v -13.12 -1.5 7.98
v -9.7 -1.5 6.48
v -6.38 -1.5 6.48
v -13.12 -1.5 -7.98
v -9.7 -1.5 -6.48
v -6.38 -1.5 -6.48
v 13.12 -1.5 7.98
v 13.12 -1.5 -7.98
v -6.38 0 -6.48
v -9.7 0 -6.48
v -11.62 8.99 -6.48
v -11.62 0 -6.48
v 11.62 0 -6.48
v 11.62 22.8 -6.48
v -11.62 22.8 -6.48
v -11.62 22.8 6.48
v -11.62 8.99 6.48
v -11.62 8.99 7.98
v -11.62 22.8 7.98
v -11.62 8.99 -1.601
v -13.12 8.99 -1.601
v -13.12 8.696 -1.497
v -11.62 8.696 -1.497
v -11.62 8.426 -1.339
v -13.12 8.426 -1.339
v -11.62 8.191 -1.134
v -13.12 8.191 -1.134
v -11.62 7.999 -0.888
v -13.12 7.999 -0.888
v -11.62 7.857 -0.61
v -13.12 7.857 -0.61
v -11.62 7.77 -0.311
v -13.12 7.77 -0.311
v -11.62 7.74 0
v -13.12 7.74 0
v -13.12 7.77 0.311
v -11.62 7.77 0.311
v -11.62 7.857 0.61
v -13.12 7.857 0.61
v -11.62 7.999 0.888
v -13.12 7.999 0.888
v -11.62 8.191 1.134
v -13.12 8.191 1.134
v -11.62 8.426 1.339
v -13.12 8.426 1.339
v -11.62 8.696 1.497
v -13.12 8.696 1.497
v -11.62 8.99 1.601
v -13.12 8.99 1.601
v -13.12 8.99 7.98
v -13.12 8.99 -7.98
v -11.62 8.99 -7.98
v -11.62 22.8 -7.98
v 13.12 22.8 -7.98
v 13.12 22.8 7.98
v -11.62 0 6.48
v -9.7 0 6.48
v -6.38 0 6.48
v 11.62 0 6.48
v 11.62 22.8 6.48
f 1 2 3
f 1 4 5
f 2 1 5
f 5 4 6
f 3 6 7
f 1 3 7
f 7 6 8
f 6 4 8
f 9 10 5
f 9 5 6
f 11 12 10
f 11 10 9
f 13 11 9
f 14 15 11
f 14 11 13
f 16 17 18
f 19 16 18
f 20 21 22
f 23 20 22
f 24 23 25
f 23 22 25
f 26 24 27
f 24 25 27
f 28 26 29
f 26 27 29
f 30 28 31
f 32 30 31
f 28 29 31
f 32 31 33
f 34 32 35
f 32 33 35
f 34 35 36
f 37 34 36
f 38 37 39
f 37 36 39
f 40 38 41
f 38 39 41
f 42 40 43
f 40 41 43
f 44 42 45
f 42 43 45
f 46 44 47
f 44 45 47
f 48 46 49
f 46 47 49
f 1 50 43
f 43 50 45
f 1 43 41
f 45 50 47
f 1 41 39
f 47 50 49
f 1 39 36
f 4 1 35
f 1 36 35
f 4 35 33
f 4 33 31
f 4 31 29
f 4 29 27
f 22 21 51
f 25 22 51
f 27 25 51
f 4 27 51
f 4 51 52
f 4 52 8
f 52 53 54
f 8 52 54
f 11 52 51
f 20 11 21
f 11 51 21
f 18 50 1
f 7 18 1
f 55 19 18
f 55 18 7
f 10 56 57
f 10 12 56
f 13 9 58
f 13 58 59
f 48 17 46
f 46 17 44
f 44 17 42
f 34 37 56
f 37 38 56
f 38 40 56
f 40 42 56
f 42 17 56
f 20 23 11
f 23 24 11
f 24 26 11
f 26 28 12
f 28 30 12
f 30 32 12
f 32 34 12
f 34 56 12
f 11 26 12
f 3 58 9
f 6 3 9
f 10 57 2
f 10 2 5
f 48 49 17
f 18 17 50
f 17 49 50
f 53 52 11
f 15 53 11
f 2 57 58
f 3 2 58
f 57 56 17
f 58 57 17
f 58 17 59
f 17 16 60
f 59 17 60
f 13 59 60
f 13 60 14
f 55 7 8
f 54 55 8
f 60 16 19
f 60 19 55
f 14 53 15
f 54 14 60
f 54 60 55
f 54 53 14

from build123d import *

# Parameters (mm, degrees)
SKETCH_13_W         = 26.24
SKETCH_13_H         = 15.96
SKETCH_13_W_2       = 23.24
SKETCH_13_H_2       = 12.96
EXTRUDE_1_DEPTH     = 22.8
SKETCH_13_3_W       = 26.24
SKETCH_13_3_H       = 15.96
SKETCH_13_3_W_2     = 23.24
SKETCH_13_3_H_2     = 12.96
SKETCH_13_3_W_3     = 18
SKETCH_13_3_W_4     = 1.92
EXTRUDE_2_DEPTH     = 1.5
CUT_EXTRUDE_4_DEPTH = 1.5


with BuildPart() as part:
    # 草图13 → 凸台-拉伸1 (new body)
    with BuildSketch(Plane(origin=(0, 0, 0), x_dir=(1, 0, 0), z_dir=(0, 1, 0))):
        Rectangle(SKETCH_13_W, SKETCH_13_H)
        Rectangle(SKETCH_13_W_2, SKETCH_13_H_2, mode=Mode.SUBTRACT)
    extrude(amount=EXTRUDE_1_DEPTH)

    # 草图13<3> → 凸台-拉伸2 (add)
    with BuildSketch(Plane(origin=(0, 0, 0), x_dir=(1, 0, 0), z_dir=(0, 1, 0))):
        Rectangle(SKETCH_13_3_W, SKETCH_13_3_H)
        Rectangle(SKETCH_13_3_W_2, SKETCH_13_3_H_2, mode=Mode.SUBTRACT)
        with Locations((2.62, 0)):
            Rectangle(SKETCH_13_3_W_3, SKETCH_13_3_H_2)
        with Locations((-10.66, 0)):
            Rectangle(SKETCH_13_3_W_4, SKETCH_13_3_H_2)
    extrude(amount=-EXTRUDE_2_DEPTH)

    # 草图15 → 切除-拉伸4 (cut)
    with BuildSketch(Plane.ZY.offset(13.12)):
        with BuildLine():
            ThreePointArc((-1.600781059, 8.99), (-1.015504801, 8.08951932), (0, 7.74))
            ThreePointArc((0, 7.74), (1.015504801, 8.08951932), (1.600781059, 8.99))
            Line((1.600781059, 8.99), (-1.600781059, 8.99))
        make_face()
        with BuildLine():
            ThreePointArc((1.65, 9.39), (-0.201508377, 11.027649039), (-1.600781059, 8.99))
            Line((-1.600781059, 8.99), (1.600781059, 8.99))
            ThreePointArc((1.600781059, 8.99), (1.637649039, 9.188491623), (1.65, 9.39))
        make_face()
        with BuildLine():
            Line((-7.98, 22.8), (-7.98, 8.99))
            Line((-7.98, 8.99), (-1.600781059, 8.99))
            ThreePointArc((-1.600781059, 8.99), (-0.201508377, 11.027649039), (1.65, 9.39))
            ThreePointArc((1.65, 9.39), (1.637649039, 9.188491623), (1.600781059, 8.99))
            Line((1.600781059, 8.99), (7.98, 8.99))
            Line((7.98, 8.99), (7.98, 22.8))
            Line((7.98, 22.8), (-7.98, 22.8))
        make_face()
    extrude(amount=-CUT_EXTRUDE_4_DEPTH, mode=Mode.SUBTRACT)


solid = part.part
